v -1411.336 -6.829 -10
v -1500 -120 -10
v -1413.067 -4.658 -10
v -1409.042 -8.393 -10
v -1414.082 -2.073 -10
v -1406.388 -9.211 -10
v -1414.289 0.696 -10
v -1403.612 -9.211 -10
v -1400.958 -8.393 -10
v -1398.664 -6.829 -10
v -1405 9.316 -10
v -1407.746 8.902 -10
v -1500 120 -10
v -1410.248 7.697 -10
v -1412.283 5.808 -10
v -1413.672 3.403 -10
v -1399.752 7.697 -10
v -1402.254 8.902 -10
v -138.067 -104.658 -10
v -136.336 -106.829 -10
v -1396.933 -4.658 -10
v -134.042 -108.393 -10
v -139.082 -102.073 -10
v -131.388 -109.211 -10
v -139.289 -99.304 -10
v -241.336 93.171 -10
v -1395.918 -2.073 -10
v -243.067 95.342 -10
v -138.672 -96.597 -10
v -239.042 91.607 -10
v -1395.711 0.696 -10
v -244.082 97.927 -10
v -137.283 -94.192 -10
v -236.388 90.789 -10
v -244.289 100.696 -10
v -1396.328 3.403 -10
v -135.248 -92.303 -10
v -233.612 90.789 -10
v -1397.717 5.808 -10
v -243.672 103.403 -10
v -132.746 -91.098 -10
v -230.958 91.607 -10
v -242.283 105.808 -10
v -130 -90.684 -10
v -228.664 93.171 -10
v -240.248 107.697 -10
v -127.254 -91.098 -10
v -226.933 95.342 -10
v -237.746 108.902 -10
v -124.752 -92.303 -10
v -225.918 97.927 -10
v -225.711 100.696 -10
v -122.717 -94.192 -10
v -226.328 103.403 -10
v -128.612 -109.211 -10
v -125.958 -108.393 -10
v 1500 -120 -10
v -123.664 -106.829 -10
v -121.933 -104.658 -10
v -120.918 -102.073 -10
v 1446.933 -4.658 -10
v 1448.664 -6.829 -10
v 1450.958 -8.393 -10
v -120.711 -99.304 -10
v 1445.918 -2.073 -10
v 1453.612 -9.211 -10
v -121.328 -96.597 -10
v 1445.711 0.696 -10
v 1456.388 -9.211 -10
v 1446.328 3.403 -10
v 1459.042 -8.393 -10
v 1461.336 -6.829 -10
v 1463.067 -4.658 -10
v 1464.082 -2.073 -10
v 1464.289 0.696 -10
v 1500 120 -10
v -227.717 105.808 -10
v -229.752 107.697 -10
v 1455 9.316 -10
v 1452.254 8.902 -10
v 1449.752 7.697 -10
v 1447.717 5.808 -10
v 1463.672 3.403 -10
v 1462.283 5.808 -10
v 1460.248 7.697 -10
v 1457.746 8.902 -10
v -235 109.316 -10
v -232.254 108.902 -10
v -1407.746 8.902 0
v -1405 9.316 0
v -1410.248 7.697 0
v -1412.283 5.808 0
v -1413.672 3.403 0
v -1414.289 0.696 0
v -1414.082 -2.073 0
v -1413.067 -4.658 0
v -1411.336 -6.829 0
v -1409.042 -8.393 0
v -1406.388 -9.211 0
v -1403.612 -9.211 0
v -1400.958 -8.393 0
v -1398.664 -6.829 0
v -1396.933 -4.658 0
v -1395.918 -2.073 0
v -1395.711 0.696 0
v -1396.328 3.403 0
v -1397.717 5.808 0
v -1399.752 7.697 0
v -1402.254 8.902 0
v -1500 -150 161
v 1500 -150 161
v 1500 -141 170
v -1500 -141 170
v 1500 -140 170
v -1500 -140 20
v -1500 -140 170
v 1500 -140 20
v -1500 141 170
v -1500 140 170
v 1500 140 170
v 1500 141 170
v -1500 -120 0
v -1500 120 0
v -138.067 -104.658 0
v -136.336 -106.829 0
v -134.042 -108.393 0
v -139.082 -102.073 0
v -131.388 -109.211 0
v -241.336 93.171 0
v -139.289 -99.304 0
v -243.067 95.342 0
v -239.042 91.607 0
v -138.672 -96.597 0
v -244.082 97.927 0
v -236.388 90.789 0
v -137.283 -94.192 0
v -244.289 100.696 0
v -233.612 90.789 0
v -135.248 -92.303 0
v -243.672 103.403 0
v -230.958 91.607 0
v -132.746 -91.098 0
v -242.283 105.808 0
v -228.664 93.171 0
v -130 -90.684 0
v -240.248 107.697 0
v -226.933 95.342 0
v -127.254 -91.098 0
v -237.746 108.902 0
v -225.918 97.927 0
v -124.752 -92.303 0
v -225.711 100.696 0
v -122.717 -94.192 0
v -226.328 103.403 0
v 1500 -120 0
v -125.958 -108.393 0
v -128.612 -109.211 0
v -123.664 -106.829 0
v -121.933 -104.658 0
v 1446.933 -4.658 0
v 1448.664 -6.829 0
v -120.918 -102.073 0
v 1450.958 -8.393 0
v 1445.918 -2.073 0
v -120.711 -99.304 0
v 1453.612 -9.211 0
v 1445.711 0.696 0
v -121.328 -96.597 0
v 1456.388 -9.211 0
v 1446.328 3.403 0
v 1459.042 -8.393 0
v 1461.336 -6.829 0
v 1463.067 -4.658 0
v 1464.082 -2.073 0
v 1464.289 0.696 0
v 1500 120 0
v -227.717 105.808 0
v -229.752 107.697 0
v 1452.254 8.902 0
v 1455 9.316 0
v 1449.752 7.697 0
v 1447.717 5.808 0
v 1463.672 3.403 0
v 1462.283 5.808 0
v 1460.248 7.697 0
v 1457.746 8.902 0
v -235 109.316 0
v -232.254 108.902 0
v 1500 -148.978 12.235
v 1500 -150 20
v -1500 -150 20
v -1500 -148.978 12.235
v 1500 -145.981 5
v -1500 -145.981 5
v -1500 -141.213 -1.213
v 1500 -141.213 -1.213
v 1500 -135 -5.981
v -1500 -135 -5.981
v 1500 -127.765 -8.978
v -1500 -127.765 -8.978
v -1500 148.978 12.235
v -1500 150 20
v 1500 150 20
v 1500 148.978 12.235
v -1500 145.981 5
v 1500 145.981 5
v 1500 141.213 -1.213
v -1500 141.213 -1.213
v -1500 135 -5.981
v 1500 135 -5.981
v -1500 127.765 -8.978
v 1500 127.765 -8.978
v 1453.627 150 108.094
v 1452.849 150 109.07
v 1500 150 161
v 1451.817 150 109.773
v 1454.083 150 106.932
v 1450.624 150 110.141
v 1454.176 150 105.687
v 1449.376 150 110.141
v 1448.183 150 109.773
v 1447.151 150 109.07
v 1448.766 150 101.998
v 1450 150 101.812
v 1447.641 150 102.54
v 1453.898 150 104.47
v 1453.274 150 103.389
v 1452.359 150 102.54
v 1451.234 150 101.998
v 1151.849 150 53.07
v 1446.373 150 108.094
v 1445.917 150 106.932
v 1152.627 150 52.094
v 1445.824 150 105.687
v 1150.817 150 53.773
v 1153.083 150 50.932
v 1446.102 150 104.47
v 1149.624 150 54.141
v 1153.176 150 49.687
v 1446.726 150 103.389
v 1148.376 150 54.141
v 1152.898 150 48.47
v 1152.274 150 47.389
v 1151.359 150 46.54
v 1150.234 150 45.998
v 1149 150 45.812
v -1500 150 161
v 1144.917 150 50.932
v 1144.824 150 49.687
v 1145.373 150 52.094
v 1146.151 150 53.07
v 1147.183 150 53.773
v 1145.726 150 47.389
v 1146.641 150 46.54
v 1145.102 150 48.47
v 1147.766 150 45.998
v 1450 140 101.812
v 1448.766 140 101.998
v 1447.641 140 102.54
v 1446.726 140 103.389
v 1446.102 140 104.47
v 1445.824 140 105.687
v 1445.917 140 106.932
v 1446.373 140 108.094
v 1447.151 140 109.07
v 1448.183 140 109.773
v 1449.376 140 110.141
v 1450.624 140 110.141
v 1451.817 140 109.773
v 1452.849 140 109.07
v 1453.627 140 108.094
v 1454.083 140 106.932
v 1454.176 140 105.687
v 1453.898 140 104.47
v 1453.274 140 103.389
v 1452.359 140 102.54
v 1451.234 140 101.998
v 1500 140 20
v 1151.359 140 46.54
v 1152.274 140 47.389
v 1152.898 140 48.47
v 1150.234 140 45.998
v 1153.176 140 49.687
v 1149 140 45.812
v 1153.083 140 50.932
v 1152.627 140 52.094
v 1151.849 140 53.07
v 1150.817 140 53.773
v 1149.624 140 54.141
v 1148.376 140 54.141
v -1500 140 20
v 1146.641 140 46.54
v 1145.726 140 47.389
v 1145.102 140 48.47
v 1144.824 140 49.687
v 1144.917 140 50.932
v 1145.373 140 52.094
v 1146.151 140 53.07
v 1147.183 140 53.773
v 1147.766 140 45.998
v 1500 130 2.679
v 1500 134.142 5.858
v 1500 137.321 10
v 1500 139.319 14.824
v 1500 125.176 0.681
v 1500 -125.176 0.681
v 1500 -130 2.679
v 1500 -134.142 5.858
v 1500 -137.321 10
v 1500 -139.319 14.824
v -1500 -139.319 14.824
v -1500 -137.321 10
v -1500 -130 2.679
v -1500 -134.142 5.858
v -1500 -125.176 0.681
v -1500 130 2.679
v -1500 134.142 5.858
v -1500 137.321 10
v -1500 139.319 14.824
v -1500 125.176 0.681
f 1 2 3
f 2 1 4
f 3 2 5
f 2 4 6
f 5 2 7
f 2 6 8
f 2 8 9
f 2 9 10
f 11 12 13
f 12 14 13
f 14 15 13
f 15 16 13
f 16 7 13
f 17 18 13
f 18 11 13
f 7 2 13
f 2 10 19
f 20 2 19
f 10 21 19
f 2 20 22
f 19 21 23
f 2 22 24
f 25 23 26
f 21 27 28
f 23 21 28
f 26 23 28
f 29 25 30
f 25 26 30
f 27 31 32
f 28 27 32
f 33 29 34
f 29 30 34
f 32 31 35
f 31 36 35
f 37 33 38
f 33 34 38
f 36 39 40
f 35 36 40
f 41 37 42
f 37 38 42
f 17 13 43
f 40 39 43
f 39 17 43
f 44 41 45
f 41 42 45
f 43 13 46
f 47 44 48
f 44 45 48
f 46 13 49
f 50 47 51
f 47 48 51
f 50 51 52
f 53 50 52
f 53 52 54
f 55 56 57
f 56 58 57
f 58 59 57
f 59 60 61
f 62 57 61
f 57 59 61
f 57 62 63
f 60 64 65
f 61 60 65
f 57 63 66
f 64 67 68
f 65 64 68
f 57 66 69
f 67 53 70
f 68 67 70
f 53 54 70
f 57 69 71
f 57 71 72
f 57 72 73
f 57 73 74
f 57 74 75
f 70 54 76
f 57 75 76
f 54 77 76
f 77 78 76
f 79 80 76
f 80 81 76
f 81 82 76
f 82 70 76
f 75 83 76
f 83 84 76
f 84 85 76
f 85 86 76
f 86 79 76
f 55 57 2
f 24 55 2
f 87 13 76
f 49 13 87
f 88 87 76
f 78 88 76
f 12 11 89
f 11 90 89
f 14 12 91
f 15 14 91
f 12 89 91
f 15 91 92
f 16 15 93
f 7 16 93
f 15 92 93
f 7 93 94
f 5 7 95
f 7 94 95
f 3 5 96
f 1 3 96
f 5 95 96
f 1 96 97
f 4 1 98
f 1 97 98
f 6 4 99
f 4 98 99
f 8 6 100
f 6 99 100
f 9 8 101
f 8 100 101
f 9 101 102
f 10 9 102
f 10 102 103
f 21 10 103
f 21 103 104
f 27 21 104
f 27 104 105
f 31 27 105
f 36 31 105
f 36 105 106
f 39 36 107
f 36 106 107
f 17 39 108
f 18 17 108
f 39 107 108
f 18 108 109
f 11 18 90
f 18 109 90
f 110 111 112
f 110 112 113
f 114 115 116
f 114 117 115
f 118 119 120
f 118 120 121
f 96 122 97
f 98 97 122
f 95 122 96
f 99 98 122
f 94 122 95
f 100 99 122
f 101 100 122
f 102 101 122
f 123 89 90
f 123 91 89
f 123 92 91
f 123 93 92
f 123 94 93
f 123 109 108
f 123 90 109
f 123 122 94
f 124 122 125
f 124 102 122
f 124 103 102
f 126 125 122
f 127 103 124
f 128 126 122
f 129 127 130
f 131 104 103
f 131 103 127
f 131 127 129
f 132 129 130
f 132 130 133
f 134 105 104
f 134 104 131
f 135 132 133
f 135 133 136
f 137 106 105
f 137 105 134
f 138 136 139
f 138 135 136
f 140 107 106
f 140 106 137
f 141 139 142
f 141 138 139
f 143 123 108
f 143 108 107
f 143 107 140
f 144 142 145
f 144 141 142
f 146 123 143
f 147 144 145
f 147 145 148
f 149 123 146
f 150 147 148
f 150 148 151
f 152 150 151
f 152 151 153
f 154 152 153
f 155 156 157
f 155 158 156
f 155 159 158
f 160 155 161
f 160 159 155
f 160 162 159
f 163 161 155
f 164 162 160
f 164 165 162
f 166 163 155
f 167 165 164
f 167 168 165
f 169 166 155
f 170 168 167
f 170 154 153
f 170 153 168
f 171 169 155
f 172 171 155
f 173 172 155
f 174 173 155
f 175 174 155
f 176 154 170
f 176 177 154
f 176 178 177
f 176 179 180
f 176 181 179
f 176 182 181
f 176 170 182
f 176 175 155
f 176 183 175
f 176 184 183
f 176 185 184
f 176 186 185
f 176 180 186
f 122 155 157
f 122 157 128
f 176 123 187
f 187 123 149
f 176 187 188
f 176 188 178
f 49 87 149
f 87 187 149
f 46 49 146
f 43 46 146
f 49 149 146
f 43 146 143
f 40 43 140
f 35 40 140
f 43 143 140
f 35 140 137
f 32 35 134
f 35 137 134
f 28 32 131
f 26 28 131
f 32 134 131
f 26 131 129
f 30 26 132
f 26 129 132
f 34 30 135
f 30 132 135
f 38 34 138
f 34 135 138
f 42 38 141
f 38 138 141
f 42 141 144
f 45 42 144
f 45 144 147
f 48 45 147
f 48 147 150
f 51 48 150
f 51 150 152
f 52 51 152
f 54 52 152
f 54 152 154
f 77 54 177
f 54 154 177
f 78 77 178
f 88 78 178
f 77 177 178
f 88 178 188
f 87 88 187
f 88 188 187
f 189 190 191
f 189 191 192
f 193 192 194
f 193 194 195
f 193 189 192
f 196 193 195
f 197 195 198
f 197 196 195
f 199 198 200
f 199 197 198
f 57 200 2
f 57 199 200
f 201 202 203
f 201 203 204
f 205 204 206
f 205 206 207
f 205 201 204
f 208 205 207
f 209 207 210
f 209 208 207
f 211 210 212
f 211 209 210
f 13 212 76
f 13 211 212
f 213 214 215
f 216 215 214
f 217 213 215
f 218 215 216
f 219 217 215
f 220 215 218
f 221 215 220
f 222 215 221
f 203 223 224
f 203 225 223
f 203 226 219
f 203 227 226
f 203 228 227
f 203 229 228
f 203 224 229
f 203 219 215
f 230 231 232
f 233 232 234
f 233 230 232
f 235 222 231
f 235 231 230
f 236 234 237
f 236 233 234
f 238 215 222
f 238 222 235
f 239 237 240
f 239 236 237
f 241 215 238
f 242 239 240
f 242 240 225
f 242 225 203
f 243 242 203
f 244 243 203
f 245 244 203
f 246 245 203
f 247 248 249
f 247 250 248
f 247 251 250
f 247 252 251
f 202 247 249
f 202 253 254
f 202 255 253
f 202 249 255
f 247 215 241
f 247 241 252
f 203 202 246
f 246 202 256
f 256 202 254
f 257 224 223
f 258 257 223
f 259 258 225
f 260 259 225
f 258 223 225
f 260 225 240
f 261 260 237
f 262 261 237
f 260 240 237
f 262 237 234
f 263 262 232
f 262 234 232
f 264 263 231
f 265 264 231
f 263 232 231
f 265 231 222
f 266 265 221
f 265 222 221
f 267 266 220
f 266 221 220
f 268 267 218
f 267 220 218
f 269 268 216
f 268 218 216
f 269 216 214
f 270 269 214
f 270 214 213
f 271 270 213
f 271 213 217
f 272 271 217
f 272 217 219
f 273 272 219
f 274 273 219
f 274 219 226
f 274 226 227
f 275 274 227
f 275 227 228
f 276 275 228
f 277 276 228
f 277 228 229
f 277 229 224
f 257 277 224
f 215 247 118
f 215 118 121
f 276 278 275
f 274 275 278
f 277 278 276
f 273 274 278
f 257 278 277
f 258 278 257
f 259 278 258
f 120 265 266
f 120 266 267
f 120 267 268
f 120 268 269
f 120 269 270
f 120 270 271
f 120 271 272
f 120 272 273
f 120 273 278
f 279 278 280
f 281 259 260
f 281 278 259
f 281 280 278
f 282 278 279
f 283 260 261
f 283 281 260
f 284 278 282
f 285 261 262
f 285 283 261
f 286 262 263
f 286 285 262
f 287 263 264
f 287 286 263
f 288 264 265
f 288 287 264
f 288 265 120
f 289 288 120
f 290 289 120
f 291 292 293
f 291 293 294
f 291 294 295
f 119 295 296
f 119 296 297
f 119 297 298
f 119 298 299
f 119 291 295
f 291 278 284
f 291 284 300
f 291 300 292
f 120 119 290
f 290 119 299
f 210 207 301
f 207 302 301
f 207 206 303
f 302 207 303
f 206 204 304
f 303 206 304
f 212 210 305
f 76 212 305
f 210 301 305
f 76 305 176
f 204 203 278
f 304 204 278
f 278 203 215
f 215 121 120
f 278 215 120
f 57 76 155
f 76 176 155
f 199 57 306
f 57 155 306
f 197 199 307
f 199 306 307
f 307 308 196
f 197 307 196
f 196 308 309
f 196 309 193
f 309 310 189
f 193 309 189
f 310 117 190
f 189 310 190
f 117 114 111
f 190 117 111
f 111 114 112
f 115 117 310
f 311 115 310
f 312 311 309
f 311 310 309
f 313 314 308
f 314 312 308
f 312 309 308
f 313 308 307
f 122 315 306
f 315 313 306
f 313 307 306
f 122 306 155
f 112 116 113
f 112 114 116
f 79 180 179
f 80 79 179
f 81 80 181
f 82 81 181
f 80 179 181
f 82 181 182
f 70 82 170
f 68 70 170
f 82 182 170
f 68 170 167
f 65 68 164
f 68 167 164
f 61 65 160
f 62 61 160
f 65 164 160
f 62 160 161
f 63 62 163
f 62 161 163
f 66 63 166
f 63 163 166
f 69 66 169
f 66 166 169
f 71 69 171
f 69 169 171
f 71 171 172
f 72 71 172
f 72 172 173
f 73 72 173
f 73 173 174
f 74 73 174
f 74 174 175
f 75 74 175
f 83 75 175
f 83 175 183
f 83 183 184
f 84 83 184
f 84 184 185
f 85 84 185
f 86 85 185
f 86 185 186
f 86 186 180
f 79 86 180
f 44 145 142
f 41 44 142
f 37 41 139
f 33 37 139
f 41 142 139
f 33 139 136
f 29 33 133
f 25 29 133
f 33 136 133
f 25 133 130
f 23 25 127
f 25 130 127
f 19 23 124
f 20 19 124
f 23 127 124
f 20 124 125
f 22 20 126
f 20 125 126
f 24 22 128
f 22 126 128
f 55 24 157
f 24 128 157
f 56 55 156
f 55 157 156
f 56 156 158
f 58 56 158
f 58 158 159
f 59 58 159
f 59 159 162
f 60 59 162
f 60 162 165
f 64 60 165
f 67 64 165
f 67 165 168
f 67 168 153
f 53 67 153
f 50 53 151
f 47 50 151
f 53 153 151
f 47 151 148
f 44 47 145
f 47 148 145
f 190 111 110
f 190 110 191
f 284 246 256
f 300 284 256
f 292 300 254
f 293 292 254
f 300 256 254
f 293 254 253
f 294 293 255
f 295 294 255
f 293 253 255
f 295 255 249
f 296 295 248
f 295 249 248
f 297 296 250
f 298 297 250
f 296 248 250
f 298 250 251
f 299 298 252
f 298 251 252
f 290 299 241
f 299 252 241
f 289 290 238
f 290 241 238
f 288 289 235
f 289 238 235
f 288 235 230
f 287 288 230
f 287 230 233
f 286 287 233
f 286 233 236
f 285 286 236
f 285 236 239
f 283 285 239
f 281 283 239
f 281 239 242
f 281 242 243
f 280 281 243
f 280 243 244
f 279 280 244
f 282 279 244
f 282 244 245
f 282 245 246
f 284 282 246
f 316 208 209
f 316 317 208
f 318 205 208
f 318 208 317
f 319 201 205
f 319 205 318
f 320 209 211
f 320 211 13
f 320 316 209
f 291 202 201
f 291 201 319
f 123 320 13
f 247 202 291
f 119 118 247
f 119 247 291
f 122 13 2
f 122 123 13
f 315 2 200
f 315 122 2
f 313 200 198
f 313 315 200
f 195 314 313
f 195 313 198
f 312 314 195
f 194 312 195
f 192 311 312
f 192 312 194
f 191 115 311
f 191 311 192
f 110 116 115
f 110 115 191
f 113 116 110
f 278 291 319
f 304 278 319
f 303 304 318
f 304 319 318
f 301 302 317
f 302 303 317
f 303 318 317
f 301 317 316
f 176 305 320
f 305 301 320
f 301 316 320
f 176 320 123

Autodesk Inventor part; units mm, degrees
ref_plane "YZ Plane" through (0, 0, 0) normal (1, 0, 0) x (0, 1, 0)
ref_plane "XZ Plane" through (0, 0, 0) normal (0, 1, 0) x (-1, 0, 0)
ref_plane "XY Plane" through (0, 0, 0) normal (0, 0, 1) x (1, 0, 0)
sketch "Sketch1" plane through (0, 0, 0) normal (0, 0, 1) x (1, 0, 0)
  line L0 (0, 196) -> (0, -196)
  line L1 (-2100, 0) -> (2100, 0)
  line L2 (-1500, 140) -> (1500, 140)
  line L3 (1500, 140) -> (1500, -140)
  line L4 (1500, -140) -> (-1500, -140)
  line L5 (-1500, -140) -> (-1500, 140)
  point P0 (0, 0)
  dimension "d0" = 3000
  dimension "d1" = 280
extrude "Plate1" add sketch "Sketch1" against normal blind 10
sketch "Sketch2" plane through (-1500, 140, 0) normal (0, 1, 0) x (-1, 0, 0)
  line L0 (-3000, 0) -> (0, 0)
  line L1 (0, 0) -> (0, 170)
  line L2 (0, 170) -> (-3000, 170)
  line L3 (-3000, 170) -> (-3000, 0)
edge flange "Flange1" height 180 angle 90 thickness 10 bend radius 20 thickness toward (0, 1, 0) relief tear relief width 10 relief depth 5 corner gap 10 corner form 0 edges at (0, 140, 0) (0, -140, 0) wall of the first edge with corners at (1500, 140, 0) (-1500, 140, 0) (-1500, 140, 170) (1500, 140, 170)
bend "Bend1"
corner "Corner1"
chamfer "Chamfer1" distance 9 angle 45 2 edges at (0, -150, 170) (0, 150, 170)
sketch "Sketch3" plane through (0, 0, -10) normal (0, 0, -1) x (-1, 0, 0)
  line L0 (-1500, -120) -> (1500, -120) projected
  line L1 (1500, 120) -> (1500, -120) projected
  line L2 (1500, 120) -> (-1500, 120) projected
  line L3 (-1500, -120) -> (-1500, 120) projected
  line L4 (-1500, 150) -> (1500, 150) projected
  line L5 (1500, -150) -> (-1500, -150) projected
  line L6 (303.3431, 108.3365) -> (61.6569, 108.3365) projected
  point P0 (0, 0)
  point P1 (1405, 0)
  point P2 (-1455, 0)
  point P3 (235, 100)
  point P4 (130, -100)
  dimension "d16" = 45
  dimension "d17" = 95
  dimension "d18" = 105
  dimension "d19" = 130
  dimension "d20" = 100
  dimension "d29" = 100
hole "Hole1" at (-1405, 0, -10) at (1455, 0, -10) at (-235, 100, -10) at (-130, -100, -10) direction (0, 0, 1) diameter 18.631 end through all thread size "G20.955x1.814" designation "G 1/2" standard "GB Pipe Threads without seal"
sketch "Sketch4" plane through (-1500, 140, 170) normal (0, -1, 0) x (1, 0, 0)
  line L0 (3000, -150) -> (0, -150) projected
  line L1 (3000, -180) -> (3000, -150) projected
  line L2 (0, -180) -> (3000, -180) projected
  line L3 (0, -150) -> (0, -180) projected
  line L4 (3000, -9) -> (0, -9) projected
  line L5 (3000, -150) -> (3000, -9) projected
  line L6 (3000, -150) -> (0, -150) projected
  line L7 (0, -9) -> (0, -150) projected
  point P0 (1500, -170)
  point P1 (2950, -64)
  point P2 (2649, -120)
  dimension "d30" = 50
  dimension "d31" = 116
  dimension "d32" = 351
  dimension "d33" = 60
hole "Hole2" at (1450, 140, 106) at (1149, 140, 50) direction (0, 1, 0) diameter 8.376 end through all thread size "M10x1.5" class "6H" standard "ISO Metric profile"
equation "\"d2\" = Thickness"
equation "\"d3\" = BendReliefWidth"
equation "\"d4\" = BendReliefDepth"
equation "\"d5\" = MinimumRemnant"
equation "\"d6\" = TransitionRadius"
equation "\"d10\" = CornerReliefSize"
equation "\"d11\" = GapSize"
equation "\"d12\" = JacobiRadiusSize"
equation "\"BendReliefDepth\" = 0.5 * Thickness"
equation "\"Thickness\" = 10"
equation "\"BendReliefWidth\" = 10"
equation "\"MinimumRemnant\" = 20"
equation "\"TransitionRadius\" = 10"
equation "\"CornerReliefSize\" = 40"
equation "\"GapSize\" = 10"
equation "\"JacobiRadiusSize\" = 10"
properties part number "SlipersLåda 211018001" material "Steel, Mild"
